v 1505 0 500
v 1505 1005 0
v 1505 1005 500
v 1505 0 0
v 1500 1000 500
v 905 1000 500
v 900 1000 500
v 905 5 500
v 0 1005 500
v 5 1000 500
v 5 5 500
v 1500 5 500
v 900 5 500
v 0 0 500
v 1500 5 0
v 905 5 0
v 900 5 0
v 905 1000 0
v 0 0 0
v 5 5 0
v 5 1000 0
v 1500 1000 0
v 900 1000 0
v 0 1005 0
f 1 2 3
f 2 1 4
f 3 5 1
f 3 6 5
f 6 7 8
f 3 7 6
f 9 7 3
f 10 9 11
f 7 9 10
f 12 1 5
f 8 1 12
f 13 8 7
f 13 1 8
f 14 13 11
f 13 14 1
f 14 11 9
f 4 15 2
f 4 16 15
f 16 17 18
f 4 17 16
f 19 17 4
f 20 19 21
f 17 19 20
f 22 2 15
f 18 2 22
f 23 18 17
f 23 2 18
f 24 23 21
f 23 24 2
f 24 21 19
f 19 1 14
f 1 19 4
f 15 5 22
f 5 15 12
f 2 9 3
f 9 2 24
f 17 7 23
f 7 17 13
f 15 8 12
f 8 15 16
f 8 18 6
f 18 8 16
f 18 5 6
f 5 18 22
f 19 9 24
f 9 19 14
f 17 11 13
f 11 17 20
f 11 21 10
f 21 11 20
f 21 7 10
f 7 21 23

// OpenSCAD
module L(x1,y1,x2,y2){
    if(x1==x2)
    {
        
        translate([y1,x1,0])cube([y2-y1+5,5,deep]);;
    }
    else 
    {
        
        translate([y1,x1,0])cube([5,x2-x1+5,deep]);;
    }
}
function pdis(x1,y1,x2,y2) = sqrt((x2-x1)*(x2-x1)+(y2-y1)*(y2-y1));
deep = 500;
L(0,1500.0,0,1500);L(0,1500.0,1000,1500.0);L(1000,1500.0,1000,1500);L(0,1500,1000,1500);L(0,900.0,0,1500.0);L(0,900.0,1000,900.0);L(1000,900.0,1000,1500.0);L(0,1500.0,1000,1500.0);L(0,0,0,900.0);L(0,0,1000,0);L(1000,0,1000,900.0);L(0,900.0,1000,900.0);
